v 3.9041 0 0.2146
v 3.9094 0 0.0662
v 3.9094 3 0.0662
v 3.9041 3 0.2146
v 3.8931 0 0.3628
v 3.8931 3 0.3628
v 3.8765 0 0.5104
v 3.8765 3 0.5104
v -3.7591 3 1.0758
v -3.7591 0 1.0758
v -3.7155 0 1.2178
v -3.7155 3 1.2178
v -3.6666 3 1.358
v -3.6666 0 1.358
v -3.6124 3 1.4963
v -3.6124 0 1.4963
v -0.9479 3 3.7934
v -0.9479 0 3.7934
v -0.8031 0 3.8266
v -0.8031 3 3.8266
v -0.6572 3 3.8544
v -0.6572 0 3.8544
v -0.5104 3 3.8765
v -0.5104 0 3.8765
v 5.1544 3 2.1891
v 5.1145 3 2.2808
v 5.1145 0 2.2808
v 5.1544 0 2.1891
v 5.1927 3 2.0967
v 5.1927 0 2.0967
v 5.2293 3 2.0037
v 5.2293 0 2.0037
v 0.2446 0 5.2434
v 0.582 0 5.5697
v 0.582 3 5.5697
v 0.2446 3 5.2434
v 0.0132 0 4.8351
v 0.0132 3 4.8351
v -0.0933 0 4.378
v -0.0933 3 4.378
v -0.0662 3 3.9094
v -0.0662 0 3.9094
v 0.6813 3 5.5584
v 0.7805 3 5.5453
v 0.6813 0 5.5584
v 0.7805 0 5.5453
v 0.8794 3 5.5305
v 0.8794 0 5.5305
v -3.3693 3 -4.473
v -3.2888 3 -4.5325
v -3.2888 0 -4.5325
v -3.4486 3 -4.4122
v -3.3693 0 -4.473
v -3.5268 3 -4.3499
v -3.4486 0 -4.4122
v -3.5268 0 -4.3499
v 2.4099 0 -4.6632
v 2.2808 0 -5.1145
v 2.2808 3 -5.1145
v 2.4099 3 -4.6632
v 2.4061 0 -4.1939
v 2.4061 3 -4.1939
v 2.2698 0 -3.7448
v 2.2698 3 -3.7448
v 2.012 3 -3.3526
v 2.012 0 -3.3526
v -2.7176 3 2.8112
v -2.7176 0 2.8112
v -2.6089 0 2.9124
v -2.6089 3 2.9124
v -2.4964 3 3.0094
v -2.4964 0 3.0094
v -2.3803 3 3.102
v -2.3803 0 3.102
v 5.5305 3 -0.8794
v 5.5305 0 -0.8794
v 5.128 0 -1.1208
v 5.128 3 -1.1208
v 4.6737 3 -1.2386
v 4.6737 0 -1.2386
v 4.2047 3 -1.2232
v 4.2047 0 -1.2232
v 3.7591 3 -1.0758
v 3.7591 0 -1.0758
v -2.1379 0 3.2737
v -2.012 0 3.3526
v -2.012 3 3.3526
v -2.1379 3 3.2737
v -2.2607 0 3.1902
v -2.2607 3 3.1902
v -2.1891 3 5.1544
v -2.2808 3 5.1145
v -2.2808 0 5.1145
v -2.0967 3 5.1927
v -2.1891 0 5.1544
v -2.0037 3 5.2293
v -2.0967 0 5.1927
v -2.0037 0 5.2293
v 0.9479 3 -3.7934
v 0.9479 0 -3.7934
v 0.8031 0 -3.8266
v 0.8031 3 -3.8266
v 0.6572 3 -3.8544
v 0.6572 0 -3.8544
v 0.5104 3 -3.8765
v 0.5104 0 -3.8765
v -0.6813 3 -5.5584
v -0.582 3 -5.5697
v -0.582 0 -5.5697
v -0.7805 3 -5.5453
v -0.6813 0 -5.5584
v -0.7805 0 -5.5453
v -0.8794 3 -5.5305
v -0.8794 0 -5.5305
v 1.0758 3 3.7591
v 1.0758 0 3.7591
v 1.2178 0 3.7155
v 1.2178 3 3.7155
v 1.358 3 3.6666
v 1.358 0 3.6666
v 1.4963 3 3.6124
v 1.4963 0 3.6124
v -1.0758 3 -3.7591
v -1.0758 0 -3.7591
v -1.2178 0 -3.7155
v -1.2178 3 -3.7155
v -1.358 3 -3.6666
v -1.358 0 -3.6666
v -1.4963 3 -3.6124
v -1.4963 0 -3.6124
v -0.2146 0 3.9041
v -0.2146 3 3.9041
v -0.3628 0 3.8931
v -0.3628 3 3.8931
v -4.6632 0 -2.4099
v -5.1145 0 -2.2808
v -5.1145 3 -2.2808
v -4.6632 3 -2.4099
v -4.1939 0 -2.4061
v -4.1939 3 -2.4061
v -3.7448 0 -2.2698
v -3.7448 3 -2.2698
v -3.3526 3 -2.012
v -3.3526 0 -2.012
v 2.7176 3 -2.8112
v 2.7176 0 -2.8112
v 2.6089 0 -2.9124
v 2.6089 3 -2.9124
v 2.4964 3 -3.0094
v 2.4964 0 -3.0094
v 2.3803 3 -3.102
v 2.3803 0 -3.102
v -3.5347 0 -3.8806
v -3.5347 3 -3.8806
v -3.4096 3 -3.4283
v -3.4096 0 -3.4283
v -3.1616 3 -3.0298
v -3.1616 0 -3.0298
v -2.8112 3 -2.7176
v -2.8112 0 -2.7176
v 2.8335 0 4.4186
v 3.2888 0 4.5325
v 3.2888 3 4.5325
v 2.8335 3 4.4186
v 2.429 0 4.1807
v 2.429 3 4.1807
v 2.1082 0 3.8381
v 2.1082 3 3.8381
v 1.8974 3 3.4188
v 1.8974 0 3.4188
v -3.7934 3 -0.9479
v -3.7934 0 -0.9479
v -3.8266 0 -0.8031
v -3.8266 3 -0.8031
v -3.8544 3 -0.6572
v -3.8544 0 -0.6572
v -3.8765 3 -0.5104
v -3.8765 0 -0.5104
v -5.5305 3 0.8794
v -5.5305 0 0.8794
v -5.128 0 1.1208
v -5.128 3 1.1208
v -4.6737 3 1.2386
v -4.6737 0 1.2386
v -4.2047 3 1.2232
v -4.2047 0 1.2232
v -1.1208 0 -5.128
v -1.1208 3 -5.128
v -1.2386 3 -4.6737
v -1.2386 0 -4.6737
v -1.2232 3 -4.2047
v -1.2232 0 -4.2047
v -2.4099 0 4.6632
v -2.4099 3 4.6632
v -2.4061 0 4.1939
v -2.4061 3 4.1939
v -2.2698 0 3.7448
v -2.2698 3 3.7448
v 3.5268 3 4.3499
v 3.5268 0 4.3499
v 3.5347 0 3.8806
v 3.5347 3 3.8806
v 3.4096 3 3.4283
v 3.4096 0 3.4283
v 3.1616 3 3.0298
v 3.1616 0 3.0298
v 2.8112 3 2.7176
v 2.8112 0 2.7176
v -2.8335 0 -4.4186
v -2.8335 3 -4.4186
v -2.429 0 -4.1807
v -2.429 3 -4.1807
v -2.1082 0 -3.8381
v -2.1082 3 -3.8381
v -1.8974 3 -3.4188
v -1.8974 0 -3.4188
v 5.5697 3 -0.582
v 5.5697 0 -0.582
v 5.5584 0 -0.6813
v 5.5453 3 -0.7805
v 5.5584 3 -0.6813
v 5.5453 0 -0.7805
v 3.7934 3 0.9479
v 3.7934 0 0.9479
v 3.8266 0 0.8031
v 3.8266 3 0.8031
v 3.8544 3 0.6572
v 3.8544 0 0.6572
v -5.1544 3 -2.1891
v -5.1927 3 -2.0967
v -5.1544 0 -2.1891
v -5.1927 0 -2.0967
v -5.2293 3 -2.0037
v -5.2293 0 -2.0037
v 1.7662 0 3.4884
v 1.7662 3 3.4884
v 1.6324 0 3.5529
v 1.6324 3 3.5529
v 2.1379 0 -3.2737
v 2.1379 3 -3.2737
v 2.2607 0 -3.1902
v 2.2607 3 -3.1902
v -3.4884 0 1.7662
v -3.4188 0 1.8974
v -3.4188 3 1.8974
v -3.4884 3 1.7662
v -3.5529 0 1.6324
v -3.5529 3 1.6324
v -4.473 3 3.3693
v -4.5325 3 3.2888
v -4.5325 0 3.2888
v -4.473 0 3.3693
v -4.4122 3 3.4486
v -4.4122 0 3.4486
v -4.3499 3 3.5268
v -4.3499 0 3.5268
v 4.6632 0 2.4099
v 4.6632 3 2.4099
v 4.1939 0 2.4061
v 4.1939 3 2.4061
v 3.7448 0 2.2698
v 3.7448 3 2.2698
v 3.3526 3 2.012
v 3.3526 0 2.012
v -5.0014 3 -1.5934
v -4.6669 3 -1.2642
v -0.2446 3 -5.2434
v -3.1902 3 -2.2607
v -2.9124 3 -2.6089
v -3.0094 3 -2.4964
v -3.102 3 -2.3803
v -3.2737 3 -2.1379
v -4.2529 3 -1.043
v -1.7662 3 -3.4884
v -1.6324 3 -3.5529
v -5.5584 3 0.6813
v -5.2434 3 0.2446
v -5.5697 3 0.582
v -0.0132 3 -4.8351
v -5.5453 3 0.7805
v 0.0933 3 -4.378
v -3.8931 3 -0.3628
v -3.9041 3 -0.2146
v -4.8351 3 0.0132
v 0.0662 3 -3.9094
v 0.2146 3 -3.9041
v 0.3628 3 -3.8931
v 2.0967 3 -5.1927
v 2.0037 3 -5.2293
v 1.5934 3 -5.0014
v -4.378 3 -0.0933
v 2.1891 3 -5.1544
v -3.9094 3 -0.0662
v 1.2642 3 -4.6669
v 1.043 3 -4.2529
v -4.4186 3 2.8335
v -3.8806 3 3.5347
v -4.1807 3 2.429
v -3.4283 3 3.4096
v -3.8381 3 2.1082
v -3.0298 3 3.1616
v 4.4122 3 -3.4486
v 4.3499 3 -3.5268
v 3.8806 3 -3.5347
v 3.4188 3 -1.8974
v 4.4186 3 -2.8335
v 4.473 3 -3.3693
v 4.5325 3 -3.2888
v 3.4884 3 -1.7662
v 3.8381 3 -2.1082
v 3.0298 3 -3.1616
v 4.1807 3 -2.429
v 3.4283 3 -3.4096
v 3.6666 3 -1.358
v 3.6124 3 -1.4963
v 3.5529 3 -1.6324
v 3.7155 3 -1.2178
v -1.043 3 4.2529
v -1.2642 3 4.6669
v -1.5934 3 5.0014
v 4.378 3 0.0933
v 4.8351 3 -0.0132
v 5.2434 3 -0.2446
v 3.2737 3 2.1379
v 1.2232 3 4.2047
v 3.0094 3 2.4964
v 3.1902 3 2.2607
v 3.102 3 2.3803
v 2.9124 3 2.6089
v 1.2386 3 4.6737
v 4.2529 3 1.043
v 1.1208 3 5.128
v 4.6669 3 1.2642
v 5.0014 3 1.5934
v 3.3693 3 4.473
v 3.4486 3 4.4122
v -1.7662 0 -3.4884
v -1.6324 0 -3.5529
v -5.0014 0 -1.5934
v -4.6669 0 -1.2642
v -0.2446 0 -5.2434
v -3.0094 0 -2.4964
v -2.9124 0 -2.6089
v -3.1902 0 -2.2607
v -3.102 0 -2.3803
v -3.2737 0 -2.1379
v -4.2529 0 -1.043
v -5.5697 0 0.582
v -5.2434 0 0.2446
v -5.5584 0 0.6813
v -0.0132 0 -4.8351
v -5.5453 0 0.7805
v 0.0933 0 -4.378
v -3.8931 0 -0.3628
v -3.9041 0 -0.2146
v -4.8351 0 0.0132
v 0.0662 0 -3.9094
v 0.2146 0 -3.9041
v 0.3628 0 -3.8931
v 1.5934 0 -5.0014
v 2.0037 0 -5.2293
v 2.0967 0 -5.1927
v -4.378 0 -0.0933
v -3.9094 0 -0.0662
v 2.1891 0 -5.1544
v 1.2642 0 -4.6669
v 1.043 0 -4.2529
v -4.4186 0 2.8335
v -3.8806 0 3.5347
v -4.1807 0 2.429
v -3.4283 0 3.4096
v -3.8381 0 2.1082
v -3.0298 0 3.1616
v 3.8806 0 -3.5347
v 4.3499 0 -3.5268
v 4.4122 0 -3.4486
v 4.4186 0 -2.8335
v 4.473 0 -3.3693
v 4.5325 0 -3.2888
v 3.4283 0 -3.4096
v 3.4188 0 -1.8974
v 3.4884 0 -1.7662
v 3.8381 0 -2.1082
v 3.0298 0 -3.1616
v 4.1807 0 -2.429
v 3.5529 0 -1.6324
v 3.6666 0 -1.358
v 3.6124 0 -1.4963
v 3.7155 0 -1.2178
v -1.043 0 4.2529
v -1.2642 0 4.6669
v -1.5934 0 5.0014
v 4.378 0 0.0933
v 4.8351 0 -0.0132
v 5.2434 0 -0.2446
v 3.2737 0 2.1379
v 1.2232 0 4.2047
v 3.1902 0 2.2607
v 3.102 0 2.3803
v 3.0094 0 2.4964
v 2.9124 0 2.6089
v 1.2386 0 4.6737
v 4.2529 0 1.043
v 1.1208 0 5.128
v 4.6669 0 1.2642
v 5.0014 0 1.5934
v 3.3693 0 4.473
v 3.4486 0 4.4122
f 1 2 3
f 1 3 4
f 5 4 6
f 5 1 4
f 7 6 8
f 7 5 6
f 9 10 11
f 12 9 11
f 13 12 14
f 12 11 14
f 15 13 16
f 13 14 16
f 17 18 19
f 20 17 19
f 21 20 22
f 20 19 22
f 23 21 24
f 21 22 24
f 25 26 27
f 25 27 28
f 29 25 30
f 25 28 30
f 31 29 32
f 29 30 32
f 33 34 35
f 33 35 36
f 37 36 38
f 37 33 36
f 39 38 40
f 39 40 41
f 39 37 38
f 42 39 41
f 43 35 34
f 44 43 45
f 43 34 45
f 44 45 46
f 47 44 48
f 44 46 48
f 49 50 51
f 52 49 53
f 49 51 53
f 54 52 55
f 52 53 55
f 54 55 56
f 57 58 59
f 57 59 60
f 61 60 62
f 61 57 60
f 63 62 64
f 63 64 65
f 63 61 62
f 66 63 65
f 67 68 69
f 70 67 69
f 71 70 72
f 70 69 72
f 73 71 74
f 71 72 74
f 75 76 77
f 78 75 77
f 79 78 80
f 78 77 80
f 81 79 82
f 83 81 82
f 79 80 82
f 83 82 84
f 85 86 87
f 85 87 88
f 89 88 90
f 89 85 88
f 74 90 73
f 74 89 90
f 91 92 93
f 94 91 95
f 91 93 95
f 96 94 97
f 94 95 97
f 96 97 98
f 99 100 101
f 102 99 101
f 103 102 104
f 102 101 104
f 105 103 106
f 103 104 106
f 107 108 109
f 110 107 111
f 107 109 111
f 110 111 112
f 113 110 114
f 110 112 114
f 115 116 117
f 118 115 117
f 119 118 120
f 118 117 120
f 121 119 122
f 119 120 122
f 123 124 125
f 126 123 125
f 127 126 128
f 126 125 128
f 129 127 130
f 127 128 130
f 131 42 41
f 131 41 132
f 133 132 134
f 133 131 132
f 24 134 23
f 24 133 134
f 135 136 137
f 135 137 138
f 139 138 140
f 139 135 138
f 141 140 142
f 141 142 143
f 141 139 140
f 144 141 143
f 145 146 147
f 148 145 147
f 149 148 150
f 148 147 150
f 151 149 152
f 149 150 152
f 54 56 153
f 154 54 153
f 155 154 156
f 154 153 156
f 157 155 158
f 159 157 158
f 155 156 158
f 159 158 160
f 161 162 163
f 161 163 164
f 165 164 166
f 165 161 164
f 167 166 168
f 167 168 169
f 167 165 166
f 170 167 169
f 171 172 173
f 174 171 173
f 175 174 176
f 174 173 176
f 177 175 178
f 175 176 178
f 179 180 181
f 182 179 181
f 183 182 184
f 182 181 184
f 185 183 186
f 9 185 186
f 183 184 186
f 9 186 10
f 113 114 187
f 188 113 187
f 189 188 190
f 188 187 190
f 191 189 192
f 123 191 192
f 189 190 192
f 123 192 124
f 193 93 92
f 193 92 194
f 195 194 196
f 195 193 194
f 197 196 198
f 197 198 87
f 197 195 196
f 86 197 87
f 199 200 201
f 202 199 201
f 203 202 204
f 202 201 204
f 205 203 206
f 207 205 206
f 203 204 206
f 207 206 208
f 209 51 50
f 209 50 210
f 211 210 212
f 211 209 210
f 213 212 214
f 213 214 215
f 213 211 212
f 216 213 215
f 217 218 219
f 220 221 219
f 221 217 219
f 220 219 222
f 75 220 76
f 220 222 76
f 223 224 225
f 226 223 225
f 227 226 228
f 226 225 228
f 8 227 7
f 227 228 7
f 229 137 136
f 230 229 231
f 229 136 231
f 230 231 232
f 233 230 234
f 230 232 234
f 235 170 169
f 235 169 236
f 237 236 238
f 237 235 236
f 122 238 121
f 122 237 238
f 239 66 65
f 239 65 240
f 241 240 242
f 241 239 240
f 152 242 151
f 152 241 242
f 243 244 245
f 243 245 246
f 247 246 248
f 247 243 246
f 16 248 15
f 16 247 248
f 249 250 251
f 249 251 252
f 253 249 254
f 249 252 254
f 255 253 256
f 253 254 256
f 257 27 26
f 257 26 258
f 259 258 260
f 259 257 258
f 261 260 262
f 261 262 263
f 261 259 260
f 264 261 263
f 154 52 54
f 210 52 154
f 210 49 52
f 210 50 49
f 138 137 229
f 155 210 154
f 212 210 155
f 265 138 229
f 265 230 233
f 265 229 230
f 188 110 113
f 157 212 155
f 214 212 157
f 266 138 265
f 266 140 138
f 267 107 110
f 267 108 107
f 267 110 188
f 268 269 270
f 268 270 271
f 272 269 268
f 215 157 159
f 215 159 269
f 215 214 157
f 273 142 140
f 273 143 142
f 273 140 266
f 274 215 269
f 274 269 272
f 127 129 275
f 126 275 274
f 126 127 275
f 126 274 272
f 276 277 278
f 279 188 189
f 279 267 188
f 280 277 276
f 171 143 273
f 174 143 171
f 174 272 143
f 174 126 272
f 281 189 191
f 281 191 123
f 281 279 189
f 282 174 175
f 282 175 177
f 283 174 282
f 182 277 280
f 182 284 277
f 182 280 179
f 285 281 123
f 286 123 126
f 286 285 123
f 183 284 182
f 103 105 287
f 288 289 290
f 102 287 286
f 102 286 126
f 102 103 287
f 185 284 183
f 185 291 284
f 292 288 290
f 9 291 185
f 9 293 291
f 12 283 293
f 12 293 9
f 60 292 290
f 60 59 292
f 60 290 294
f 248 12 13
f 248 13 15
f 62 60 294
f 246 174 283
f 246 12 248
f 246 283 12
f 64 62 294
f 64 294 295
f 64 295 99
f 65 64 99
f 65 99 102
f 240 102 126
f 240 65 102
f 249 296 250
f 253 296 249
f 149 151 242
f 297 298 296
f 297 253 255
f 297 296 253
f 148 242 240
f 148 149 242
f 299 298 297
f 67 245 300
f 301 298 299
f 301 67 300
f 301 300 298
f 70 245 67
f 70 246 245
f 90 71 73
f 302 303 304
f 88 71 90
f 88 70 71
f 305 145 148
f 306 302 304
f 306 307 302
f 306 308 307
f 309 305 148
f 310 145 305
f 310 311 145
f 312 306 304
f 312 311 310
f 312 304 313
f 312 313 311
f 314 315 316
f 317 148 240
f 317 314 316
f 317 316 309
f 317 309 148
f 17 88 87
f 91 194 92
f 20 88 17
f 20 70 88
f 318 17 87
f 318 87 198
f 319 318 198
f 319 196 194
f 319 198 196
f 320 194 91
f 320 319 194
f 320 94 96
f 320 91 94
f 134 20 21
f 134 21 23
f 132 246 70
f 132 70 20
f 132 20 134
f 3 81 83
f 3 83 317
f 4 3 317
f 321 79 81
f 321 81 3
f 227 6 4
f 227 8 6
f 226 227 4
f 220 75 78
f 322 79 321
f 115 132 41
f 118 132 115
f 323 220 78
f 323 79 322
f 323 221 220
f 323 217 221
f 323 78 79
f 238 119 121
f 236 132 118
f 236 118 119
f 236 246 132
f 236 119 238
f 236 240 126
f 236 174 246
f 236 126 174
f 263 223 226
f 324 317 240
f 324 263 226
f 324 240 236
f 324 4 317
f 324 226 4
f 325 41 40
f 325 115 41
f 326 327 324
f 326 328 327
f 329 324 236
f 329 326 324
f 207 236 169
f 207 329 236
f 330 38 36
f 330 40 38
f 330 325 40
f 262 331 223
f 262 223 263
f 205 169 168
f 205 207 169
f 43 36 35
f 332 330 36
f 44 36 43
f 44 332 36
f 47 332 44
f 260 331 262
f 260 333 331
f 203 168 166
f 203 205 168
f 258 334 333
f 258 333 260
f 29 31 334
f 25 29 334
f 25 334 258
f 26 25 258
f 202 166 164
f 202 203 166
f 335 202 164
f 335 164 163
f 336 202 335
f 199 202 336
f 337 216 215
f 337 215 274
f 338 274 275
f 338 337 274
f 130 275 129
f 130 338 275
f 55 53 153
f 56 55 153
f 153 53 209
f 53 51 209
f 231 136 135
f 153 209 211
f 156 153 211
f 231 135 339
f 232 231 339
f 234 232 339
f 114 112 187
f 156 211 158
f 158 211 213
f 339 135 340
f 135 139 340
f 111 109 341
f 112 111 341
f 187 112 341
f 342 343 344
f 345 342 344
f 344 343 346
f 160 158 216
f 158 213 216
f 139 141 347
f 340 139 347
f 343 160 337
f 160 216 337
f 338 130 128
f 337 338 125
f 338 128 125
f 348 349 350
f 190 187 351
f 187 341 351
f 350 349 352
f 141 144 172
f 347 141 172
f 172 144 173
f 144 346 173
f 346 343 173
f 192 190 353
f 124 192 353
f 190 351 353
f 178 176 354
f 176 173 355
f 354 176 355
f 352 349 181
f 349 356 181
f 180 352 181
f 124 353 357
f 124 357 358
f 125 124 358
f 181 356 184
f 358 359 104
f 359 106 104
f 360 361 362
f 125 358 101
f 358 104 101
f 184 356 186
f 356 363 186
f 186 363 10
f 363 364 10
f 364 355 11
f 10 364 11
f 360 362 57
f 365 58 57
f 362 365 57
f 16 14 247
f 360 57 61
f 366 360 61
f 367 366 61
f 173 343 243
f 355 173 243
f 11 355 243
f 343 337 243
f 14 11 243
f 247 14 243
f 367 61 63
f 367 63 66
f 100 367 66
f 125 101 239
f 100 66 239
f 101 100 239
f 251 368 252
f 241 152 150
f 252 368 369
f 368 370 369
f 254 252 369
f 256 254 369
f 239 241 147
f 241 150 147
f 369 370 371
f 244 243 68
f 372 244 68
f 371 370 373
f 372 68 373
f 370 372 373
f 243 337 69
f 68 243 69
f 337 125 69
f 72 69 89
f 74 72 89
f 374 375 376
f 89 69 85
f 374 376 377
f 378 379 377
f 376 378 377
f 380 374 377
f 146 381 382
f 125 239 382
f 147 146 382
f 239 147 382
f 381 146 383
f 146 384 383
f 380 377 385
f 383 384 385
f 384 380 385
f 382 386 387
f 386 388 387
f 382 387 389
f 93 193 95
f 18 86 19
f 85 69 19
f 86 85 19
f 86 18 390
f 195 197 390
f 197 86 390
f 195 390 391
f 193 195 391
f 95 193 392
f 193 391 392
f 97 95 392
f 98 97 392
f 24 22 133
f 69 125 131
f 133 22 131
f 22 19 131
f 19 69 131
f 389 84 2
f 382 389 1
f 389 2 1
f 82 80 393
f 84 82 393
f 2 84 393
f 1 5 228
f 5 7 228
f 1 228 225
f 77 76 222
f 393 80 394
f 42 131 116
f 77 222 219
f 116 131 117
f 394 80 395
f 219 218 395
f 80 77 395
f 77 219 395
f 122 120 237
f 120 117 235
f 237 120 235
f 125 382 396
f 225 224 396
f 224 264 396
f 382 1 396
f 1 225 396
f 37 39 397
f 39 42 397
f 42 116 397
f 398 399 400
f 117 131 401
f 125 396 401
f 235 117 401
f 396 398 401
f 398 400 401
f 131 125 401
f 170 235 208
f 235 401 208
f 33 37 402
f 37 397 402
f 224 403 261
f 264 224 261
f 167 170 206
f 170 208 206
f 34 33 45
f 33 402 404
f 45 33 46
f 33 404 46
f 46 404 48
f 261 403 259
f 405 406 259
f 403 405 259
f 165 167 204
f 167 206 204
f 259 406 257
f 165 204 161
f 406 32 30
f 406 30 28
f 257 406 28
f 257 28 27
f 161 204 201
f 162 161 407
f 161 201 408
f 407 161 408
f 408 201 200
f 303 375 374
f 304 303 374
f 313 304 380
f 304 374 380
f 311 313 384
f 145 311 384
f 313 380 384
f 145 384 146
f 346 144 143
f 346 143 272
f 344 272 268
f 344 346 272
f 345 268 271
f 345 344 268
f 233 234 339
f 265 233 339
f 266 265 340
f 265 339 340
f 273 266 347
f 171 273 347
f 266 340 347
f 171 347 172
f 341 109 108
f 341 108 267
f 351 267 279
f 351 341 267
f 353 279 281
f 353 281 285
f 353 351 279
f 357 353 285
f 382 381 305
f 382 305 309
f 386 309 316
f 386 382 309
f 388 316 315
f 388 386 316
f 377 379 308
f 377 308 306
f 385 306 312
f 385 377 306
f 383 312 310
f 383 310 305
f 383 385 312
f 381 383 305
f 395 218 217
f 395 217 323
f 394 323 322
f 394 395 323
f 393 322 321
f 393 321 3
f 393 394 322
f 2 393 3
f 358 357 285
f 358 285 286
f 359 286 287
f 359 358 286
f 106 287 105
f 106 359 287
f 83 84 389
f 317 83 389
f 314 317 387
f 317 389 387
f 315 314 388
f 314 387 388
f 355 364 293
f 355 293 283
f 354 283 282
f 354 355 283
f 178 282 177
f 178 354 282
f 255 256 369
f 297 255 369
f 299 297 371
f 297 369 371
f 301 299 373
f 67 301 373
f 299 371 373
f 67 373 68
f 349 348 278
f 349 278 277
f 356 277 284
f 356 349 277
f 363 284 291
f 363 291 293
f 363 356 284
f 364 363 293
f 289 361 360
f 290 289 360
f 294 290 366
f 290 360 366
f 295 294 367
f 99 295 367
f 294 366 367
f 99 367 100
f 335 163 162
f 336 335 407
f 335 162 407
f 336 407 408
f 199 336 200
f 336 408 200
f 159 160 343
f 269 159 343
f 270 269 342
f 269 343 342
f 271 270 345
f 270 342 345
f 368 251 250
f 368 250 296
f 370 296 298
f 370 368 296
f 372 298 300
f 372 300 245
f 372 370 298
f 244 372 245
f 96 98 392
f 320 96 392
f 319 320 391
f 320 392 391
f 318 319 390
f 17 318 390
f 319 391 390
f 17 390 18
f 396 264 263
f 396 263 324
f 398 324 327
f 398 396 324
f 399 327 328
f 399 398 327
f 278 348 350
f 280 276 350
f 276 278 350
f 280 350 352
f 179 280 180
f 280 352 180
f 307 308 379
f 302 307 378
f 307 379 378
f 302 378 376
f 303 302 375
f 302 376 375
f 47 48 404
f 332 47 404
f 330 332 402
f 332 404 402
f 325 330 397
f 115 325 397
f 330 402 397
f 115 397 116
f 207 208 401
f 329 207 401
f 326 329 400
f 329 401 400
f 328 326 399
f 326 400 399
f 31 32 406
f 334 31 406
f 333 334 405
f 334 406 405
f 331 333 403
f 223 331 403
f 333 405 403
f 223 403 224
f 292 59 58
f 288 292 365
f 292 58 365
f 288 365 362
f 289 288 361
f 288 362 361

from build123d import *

# Parameters (mm, degrees)
SKETCH1_R                 = 5.6
BOSS_EXTRUDE1_DEPTH       = 3
CUT_EXTRUDE1_START        = -3
CUT_EXTRUDE1_DEPTH        = 3
CIRPATTERN1_COUNT         = 12
CIRPATTERN1_START         = -3
CIRPATTERN1_COPY_1_DEPTH  = 3
CIRPATTERN1_COPY_2_DEPTH  = 3
CIRPATTERN1_COPY_3_DEPTH  = 3
CIRPATTERN1_COPY_4_DEPTH  = 3
CIRPATTERN1_COPY_5_DEPTH  = 3
CIRPATTERN1_COPY_6_DEPTH  = 3
CIRPATTERN1_COPY_7_DEPTH  = 3
CIRPATTERN1_COPY_8_DEPTH  = 3
CIRPATTERN1_COPY_9_DEPTH  = 3
CIRPATTERN1_COPY_10_DEPTH = 3
CIRPATTERN1_COPY_11_DEPTH = 3


with BuildPart() as part:
    # Sketch1 → Boss-Extrude1 (new body)
    with BuildSketch(Plane(origin=(0, 0, 0), x_dir=(1, 0, 0), z_dir=(0, 1, 0))):
        with Locations(Location((0, 0, 0), (0, 0, 270))):
            Circle(SKETCH1_R)
    extrude(amount=BOSS_EXTRUDE1_DEPTH)

    # Sketch2 → Cut-Extrude1 (cut)
    with BuildSketch(Plane(origin=(0, 3, 0), x_dir=(1, 0, 0), z_dir=(0, 1, 0)).offset(CUT_EXTRUDE1_START)):
        with BuildLine():
            Line((0.510357412, 3.876549408), (0.730946676, 5.552091224))
            ThreePointArc((0.730946676, 5.552091224), (0.075009446, 5.599497619), (-0.581962275, 5.569678618))
            ThreePointArc((-0.581962275, 5.569678618), (-0.013232679, 4.835071359), (0.066186197, 3.909439779))
            ThreePointArc((0.066186197, 3.909439779), (0.288740502, 3.899324162), (0.510357412, 3.876549408))
        make_face()
    cut_extrude1 = extrude(amount=CUT_EXTRUDE1_DEPTH, mode=Mode.SUBTRACT)

    # Mirror1: Cut-Extrude1 across plane
    add(cut_extrude1.mirror(Plane(origin=(0, 0, 0), x_dir=(-0.13052619222004483, 0, 0.9914448613738113), z_dir=(-0.9914448613738114, 0, -0.13052619222004483))), mode=Mode.SUBTRACT)

    # CirPattern1: Cut-Extrude1 ×12 about axis
    cirpattern1_axis = Axis((0, 0, 0), (0, 1, 0))
    for i in range(1, CIRPATTERN1_COUNT):
        add(cut_extrude1.rotate(cirpattern1_axis, i * 360 / CIRPATTERN1_COUNT), mode=Mode.SUBTRACT)

    # CirPattern1 copy 1 sketch → CirPattern1 copy 1 (cut)
    with BuildSketch(Plane(origin=(0, 3, 0), x_dir=(-0.9659258262890651, 0, 0.25881904510253406), z_dir=(0, 1, 0)).offset(CIRPATTERN1_START)):
        with BuildLine():
            Line((0.510357412, -3.876549408), (0.730946676, -5.552091224))
            ThreePointArc((0.730946676, -5.552091224), (0.075009446, -5.599497619), (-0.581962275, -5.569678618))
            ThreePointArc((-0.581962275, -5.569678618), (-0.013232679, -4.835071359), (0.066186197, -3.909439779))
            ThreePointArc((0.066186197, -3.909439779), (0.288740502, -3.899324162), (0.510357412, -3.876549408))
        make_face()
    extrude(amount=CIRPATTERN1_COPY_1_DEPTH, mode=Mode.SUBTRACT)

    # CirPattern1 copy 2 sketch → CirPattern1 copy 2 (cut)
    with BuildSketch(Plane(origin=(0, 3, 0), x_dir=(-0.7071067811865381, 0, 0.7071067811865575), z_dir=(0, 1, 0)).offset(CIRPATTERN1_START)):
        with BuildLine():
            Line((0.510357412, -3.876549408), (0.730946676, -5.552091224))
            ThreePointArc((0.730946676, -5.552091224), (0.075009446, -5.599497619), (-0.581962275, -5.569678618))
            ThreePointArc((-0.581962275, -5.569678618), (-0.013232679, -4.835071359), (0.066186197, -3.909439779))
            ThreePointArc((0.066186197, -3.909439779), (0.288740502, -3.899324162), (0.510357412, -3.876549408))
        make_face()
    extrude(amount=CIRPATTERN1_COPY_2_DEPTH, mode=Mode.SUBTRACT)

    # CirPattern1 copy 3 sketch → CirPattern1 copy 3 (cut)
    with BuildSketch(Plane(origin=(0, 3, 0), x_dir=(-0.25881904510250764, 0, 0.9659258262890722), z_dir=(0, 1, 0)).offset(CIRPATTERN1_START)):
        with BuildLine():
            Line((0.510357412, -3.876549408), (0.730946676, -5.552091224))
            ThreePointArc((0.730946676, -5.552091224), (0.075009446, -5.599497619), (-0.581962275, -5.569678618))
            ThreePointArc((-0.581962275, -5.569678618), (-0.013232679, -4.835071359), (0.066186197, -3.909439779))
            ThreePointArc((0.066186197, -3.909439779), (0.288740502, -3.899324162), (0.510357412, -3.876549408))
        make_face()
    extrude(amount=CIRPATTERN1_COPY_3_DEPTH, mode=Mode.SUBTRACT)

    # CirPattern1 copy 4 sketch → CirPattern1 copy 4 (cut)
    with BuildSketch(Plane(origin=(0, 3, 0), x_dir=(0.2588190451025339, 0, 0.9659258262890651), z_dir=(0, 1, 0)).offset(CIRPATTERN1_START)):
        with BuildLine():
            Line((0.510357412, -3.876549408), (0.730946676, -5.552091224))
            ThreePointArc((0.730946676, -5.552091224), (0.075009446, -5.599497619), (-0.581962275, -5.569678618))
            ThreePointArc((-0.581962275, -5.569678618), (-0.013232679, -4.835071359), (0.066186197, -3.909439779))
            ThreePointArc((0.066186197, -3.909439779), (0.288740502, -3.899324162), (0.510357412, -3.876549408))
        make_face()
    extrude(amount=CIRPATTERN1_COPY_4_DEPTH, mode=Mode.SUBTRACT)

    # CirPattern1 copy 5 sketch → CirPattern1 copy 5 (cut)
    with BuildSketch(Plane(origin=(0, 3, 0), x_dir=(0.7071067811865577, 0, 0.707106781186538), z_dir=(0, 1, 0)).offset(CIRPATTERN1_START)):
        with BuildLine():
            Line((0.510357412, -3.876549408), (0.730946676, -5.552091224))
            ThreePointArc((0.730946676, -5.552091224), (0.075009446, -5.599497619), (-0.581962275, -5.569678618))
            ThreePointArc((-0.581962275, -5.569678618), (-0.013232679, -4.835071359), (0.066186197, -3.909439779))
            ThreePointArc((0.066186197, -3.909439779), (0.288740502, -3.899324162), (0.510357412, -3.876549408))
        make_face()
    extrude(amount=CIRPATTERN1_COPY_5_DEPTH, mode=Mode.SUBTRACT)

    # CirPattern1 copy 6 sketch → CirPattern1 copy 6 (cut)
    with BuildSketch(Plane(origin=(0, 3, 0), x_dir=(0.9659258262890722, 0, 0.2588190451025077), z_dir=(0, 1, 0)).offset(CIRPATTERN1_START)):
        with BuildLine():
            Line((0.510357412, -3.876549408), (0.730946676, -5.552091224))
            ThreePointArc((0.730946676, -5.552091224), (0.075009446, -5.599497619), (-0.581962275, -5.569678618))
            ThreePointArc((-0.581962275, -5.569678618), (-0.013232679, -4.835071359), (0.066186197, -3.909439779))
            ThreePointArc((0.066186197, -3.909439779), (0.288740502, -3.899324162), (0.510357412, -3.876549408))
        make_face()
    extrude(amount=CIRPATTERN1_COPY_6_DEPTH, mode=Mode.SUBTRACT)

    # CirPattern1 copy 7 sketch → CirPattern1 copy 7 (cut)
    with BuildSketch(Plane(origin=(0, 3, 0), x_dir=(0.9659258262890651, 0, -0.2588190451025343), z_dir=(0, 1, 0)).offset(CIRPATTERN1_START)):
        with BuildLine():
            Line((0.510357412, -3.876549408), (0.730946676, -5.552091224))
            ThreePointArc((0.730946676, -5.552091224), (0.075009446, -5.599497619), (-0.581962275, -5.569678618))
            ThreePointArc((-0.581962275, -5.569678618), (-0.013232679, -4.835071359), (0.066186197, -3.909439779))
            ThreePointArc((0.066186197, -3.909439779), (0.288740502, -3.899324162), (0.510357412, -3.876549408))
        make_face()
    extrude(amount=CIRPATTERN1_COPY_7_DEPTH, mode=Mode.SUBTRACT)

    # CirPattern1 copy 8 sketch → CirPattern1 copy 8 (cut)
    with BuildSketch(Plane(origin=(0, 3, 0), x_dir=(0.7071067811865385, 0, -0.7071067811865571), z_dir=(0, 1, 0)).offset(CIRPATTERN1_START)):
        with BuildLine():
            Line((0.510357412, -3.876549408), (0.730946676, -5.552091224))
            ThreePointArc((0.730946676, -5.552091224), (0.075009446, -5.599497619), (-0.581962275, -5.569678618))
            ThreePointArc((-0.581962275, -5.569678618), (-0.013232679, -4.835071359), (0.066186197, -3.909439779))
            ThreePointArc((0.066186197, -3.909439779), (0.288740502, -3.899324162), (0.510357412, -3.876549408))
        make_face()
    extrude(amount=CIRPATTERN1_COPY_8_DEPTH, mode=Mode.SUBTRACT)

    # CirPattern1 copy 9 sketch → CirPattern1 copy 9 (cut)
    with BuildSketch(Plane(origin=(0, 3, 0), x_dir=(0.25881904510250775, 0, -0.9659258262890722), z_dir=(0, 1, 0)).offset(CIRPATTERN1_START)):
        with BuildLine():
            Line((0.510357412, -3.876549408), (0.730946676, -5.552091224))
            ThreePointArc((0.730946676, -5.552091224), (0.075009446, -5.599497619), (-0.581962275, -5.569678618))
            ThreePointArc((-0.581962275, -5.569678618), (-0.013232679, -4.835071359), (0.066186197, -3.909439779))
            ThreePointArc((0.066186197, -3.909439779), (0.288740502, -3.899324162), (0.510357412, -3.876549408))
        make_face()
    extrude(amount=CIRPATTERN1_COPY_9_DEPTH, mode=Mode.SUBTRACT)

    # CirPattern1 copy 10 sketch → CirPattern1 copy 10 (cut)
    with BuildSketch(Plane(origin=(0, 3, 0), x_dir=(-0.2588190451025343, 0, -0.9659258262890651), z_dir=(0, 1, 0)).offset(CIRPATTERN1_START)):
        with BuildLine():
            Line((0.510357412, -3.876549408), (0.730946676, -5.552091224))
            ThreePointArc((0.730946676, -5.552091224), (0.075009446, -5.599497619), (-0.581962275, -5.569678618))
            ThreePointArc((-0.581962275, -5.569678618), (-0.013232679, -4.835071359), (0.066186197, -3.909439779))
            ThreePointArc((0.066186197, -3.909439779), (0.288740502, -3.899324162), (0.510357412, -3.876549408))
        make_face()
    extrude(amount=CIRPATTERN1_COPY_10_DEPTH, mode=Mode.SUBTRACT)

    # CirPattern1 copy 11 sketch → CirPattern1 copy 11 (cut)
    with BuildSketch(Plane(origin=(0, 3, 0), x_dir=(-0.7071067811865571, 0, -0.7071067811865385), z_dir=(0, 1, 0)).offset(CIRPATTERN1_START)):
        with BuildLine():
            Line((0.510357412, -3.876549408), (0.730946676, -5.552091224))
            ThreePointArc((0.730946676, -5.552091224), (0.075009446, -5.599497619), (-0.581962275, -5.569678618))
            ThreePointArc((-0.581962275, -5.569678618), (-0.013232679, -4.835071359), (0.066186197, -3.909439779))
            ThreePointArc((0.066186197, -3.909439779), (0.288740502, -3.899324162), (0.510357412, -3.876549408))
        make_face()
    extrude(amount=CIRPATTERN1_COPY_11_DEPTH, mode=Mode.SUBTRACT)


solid = part.part
